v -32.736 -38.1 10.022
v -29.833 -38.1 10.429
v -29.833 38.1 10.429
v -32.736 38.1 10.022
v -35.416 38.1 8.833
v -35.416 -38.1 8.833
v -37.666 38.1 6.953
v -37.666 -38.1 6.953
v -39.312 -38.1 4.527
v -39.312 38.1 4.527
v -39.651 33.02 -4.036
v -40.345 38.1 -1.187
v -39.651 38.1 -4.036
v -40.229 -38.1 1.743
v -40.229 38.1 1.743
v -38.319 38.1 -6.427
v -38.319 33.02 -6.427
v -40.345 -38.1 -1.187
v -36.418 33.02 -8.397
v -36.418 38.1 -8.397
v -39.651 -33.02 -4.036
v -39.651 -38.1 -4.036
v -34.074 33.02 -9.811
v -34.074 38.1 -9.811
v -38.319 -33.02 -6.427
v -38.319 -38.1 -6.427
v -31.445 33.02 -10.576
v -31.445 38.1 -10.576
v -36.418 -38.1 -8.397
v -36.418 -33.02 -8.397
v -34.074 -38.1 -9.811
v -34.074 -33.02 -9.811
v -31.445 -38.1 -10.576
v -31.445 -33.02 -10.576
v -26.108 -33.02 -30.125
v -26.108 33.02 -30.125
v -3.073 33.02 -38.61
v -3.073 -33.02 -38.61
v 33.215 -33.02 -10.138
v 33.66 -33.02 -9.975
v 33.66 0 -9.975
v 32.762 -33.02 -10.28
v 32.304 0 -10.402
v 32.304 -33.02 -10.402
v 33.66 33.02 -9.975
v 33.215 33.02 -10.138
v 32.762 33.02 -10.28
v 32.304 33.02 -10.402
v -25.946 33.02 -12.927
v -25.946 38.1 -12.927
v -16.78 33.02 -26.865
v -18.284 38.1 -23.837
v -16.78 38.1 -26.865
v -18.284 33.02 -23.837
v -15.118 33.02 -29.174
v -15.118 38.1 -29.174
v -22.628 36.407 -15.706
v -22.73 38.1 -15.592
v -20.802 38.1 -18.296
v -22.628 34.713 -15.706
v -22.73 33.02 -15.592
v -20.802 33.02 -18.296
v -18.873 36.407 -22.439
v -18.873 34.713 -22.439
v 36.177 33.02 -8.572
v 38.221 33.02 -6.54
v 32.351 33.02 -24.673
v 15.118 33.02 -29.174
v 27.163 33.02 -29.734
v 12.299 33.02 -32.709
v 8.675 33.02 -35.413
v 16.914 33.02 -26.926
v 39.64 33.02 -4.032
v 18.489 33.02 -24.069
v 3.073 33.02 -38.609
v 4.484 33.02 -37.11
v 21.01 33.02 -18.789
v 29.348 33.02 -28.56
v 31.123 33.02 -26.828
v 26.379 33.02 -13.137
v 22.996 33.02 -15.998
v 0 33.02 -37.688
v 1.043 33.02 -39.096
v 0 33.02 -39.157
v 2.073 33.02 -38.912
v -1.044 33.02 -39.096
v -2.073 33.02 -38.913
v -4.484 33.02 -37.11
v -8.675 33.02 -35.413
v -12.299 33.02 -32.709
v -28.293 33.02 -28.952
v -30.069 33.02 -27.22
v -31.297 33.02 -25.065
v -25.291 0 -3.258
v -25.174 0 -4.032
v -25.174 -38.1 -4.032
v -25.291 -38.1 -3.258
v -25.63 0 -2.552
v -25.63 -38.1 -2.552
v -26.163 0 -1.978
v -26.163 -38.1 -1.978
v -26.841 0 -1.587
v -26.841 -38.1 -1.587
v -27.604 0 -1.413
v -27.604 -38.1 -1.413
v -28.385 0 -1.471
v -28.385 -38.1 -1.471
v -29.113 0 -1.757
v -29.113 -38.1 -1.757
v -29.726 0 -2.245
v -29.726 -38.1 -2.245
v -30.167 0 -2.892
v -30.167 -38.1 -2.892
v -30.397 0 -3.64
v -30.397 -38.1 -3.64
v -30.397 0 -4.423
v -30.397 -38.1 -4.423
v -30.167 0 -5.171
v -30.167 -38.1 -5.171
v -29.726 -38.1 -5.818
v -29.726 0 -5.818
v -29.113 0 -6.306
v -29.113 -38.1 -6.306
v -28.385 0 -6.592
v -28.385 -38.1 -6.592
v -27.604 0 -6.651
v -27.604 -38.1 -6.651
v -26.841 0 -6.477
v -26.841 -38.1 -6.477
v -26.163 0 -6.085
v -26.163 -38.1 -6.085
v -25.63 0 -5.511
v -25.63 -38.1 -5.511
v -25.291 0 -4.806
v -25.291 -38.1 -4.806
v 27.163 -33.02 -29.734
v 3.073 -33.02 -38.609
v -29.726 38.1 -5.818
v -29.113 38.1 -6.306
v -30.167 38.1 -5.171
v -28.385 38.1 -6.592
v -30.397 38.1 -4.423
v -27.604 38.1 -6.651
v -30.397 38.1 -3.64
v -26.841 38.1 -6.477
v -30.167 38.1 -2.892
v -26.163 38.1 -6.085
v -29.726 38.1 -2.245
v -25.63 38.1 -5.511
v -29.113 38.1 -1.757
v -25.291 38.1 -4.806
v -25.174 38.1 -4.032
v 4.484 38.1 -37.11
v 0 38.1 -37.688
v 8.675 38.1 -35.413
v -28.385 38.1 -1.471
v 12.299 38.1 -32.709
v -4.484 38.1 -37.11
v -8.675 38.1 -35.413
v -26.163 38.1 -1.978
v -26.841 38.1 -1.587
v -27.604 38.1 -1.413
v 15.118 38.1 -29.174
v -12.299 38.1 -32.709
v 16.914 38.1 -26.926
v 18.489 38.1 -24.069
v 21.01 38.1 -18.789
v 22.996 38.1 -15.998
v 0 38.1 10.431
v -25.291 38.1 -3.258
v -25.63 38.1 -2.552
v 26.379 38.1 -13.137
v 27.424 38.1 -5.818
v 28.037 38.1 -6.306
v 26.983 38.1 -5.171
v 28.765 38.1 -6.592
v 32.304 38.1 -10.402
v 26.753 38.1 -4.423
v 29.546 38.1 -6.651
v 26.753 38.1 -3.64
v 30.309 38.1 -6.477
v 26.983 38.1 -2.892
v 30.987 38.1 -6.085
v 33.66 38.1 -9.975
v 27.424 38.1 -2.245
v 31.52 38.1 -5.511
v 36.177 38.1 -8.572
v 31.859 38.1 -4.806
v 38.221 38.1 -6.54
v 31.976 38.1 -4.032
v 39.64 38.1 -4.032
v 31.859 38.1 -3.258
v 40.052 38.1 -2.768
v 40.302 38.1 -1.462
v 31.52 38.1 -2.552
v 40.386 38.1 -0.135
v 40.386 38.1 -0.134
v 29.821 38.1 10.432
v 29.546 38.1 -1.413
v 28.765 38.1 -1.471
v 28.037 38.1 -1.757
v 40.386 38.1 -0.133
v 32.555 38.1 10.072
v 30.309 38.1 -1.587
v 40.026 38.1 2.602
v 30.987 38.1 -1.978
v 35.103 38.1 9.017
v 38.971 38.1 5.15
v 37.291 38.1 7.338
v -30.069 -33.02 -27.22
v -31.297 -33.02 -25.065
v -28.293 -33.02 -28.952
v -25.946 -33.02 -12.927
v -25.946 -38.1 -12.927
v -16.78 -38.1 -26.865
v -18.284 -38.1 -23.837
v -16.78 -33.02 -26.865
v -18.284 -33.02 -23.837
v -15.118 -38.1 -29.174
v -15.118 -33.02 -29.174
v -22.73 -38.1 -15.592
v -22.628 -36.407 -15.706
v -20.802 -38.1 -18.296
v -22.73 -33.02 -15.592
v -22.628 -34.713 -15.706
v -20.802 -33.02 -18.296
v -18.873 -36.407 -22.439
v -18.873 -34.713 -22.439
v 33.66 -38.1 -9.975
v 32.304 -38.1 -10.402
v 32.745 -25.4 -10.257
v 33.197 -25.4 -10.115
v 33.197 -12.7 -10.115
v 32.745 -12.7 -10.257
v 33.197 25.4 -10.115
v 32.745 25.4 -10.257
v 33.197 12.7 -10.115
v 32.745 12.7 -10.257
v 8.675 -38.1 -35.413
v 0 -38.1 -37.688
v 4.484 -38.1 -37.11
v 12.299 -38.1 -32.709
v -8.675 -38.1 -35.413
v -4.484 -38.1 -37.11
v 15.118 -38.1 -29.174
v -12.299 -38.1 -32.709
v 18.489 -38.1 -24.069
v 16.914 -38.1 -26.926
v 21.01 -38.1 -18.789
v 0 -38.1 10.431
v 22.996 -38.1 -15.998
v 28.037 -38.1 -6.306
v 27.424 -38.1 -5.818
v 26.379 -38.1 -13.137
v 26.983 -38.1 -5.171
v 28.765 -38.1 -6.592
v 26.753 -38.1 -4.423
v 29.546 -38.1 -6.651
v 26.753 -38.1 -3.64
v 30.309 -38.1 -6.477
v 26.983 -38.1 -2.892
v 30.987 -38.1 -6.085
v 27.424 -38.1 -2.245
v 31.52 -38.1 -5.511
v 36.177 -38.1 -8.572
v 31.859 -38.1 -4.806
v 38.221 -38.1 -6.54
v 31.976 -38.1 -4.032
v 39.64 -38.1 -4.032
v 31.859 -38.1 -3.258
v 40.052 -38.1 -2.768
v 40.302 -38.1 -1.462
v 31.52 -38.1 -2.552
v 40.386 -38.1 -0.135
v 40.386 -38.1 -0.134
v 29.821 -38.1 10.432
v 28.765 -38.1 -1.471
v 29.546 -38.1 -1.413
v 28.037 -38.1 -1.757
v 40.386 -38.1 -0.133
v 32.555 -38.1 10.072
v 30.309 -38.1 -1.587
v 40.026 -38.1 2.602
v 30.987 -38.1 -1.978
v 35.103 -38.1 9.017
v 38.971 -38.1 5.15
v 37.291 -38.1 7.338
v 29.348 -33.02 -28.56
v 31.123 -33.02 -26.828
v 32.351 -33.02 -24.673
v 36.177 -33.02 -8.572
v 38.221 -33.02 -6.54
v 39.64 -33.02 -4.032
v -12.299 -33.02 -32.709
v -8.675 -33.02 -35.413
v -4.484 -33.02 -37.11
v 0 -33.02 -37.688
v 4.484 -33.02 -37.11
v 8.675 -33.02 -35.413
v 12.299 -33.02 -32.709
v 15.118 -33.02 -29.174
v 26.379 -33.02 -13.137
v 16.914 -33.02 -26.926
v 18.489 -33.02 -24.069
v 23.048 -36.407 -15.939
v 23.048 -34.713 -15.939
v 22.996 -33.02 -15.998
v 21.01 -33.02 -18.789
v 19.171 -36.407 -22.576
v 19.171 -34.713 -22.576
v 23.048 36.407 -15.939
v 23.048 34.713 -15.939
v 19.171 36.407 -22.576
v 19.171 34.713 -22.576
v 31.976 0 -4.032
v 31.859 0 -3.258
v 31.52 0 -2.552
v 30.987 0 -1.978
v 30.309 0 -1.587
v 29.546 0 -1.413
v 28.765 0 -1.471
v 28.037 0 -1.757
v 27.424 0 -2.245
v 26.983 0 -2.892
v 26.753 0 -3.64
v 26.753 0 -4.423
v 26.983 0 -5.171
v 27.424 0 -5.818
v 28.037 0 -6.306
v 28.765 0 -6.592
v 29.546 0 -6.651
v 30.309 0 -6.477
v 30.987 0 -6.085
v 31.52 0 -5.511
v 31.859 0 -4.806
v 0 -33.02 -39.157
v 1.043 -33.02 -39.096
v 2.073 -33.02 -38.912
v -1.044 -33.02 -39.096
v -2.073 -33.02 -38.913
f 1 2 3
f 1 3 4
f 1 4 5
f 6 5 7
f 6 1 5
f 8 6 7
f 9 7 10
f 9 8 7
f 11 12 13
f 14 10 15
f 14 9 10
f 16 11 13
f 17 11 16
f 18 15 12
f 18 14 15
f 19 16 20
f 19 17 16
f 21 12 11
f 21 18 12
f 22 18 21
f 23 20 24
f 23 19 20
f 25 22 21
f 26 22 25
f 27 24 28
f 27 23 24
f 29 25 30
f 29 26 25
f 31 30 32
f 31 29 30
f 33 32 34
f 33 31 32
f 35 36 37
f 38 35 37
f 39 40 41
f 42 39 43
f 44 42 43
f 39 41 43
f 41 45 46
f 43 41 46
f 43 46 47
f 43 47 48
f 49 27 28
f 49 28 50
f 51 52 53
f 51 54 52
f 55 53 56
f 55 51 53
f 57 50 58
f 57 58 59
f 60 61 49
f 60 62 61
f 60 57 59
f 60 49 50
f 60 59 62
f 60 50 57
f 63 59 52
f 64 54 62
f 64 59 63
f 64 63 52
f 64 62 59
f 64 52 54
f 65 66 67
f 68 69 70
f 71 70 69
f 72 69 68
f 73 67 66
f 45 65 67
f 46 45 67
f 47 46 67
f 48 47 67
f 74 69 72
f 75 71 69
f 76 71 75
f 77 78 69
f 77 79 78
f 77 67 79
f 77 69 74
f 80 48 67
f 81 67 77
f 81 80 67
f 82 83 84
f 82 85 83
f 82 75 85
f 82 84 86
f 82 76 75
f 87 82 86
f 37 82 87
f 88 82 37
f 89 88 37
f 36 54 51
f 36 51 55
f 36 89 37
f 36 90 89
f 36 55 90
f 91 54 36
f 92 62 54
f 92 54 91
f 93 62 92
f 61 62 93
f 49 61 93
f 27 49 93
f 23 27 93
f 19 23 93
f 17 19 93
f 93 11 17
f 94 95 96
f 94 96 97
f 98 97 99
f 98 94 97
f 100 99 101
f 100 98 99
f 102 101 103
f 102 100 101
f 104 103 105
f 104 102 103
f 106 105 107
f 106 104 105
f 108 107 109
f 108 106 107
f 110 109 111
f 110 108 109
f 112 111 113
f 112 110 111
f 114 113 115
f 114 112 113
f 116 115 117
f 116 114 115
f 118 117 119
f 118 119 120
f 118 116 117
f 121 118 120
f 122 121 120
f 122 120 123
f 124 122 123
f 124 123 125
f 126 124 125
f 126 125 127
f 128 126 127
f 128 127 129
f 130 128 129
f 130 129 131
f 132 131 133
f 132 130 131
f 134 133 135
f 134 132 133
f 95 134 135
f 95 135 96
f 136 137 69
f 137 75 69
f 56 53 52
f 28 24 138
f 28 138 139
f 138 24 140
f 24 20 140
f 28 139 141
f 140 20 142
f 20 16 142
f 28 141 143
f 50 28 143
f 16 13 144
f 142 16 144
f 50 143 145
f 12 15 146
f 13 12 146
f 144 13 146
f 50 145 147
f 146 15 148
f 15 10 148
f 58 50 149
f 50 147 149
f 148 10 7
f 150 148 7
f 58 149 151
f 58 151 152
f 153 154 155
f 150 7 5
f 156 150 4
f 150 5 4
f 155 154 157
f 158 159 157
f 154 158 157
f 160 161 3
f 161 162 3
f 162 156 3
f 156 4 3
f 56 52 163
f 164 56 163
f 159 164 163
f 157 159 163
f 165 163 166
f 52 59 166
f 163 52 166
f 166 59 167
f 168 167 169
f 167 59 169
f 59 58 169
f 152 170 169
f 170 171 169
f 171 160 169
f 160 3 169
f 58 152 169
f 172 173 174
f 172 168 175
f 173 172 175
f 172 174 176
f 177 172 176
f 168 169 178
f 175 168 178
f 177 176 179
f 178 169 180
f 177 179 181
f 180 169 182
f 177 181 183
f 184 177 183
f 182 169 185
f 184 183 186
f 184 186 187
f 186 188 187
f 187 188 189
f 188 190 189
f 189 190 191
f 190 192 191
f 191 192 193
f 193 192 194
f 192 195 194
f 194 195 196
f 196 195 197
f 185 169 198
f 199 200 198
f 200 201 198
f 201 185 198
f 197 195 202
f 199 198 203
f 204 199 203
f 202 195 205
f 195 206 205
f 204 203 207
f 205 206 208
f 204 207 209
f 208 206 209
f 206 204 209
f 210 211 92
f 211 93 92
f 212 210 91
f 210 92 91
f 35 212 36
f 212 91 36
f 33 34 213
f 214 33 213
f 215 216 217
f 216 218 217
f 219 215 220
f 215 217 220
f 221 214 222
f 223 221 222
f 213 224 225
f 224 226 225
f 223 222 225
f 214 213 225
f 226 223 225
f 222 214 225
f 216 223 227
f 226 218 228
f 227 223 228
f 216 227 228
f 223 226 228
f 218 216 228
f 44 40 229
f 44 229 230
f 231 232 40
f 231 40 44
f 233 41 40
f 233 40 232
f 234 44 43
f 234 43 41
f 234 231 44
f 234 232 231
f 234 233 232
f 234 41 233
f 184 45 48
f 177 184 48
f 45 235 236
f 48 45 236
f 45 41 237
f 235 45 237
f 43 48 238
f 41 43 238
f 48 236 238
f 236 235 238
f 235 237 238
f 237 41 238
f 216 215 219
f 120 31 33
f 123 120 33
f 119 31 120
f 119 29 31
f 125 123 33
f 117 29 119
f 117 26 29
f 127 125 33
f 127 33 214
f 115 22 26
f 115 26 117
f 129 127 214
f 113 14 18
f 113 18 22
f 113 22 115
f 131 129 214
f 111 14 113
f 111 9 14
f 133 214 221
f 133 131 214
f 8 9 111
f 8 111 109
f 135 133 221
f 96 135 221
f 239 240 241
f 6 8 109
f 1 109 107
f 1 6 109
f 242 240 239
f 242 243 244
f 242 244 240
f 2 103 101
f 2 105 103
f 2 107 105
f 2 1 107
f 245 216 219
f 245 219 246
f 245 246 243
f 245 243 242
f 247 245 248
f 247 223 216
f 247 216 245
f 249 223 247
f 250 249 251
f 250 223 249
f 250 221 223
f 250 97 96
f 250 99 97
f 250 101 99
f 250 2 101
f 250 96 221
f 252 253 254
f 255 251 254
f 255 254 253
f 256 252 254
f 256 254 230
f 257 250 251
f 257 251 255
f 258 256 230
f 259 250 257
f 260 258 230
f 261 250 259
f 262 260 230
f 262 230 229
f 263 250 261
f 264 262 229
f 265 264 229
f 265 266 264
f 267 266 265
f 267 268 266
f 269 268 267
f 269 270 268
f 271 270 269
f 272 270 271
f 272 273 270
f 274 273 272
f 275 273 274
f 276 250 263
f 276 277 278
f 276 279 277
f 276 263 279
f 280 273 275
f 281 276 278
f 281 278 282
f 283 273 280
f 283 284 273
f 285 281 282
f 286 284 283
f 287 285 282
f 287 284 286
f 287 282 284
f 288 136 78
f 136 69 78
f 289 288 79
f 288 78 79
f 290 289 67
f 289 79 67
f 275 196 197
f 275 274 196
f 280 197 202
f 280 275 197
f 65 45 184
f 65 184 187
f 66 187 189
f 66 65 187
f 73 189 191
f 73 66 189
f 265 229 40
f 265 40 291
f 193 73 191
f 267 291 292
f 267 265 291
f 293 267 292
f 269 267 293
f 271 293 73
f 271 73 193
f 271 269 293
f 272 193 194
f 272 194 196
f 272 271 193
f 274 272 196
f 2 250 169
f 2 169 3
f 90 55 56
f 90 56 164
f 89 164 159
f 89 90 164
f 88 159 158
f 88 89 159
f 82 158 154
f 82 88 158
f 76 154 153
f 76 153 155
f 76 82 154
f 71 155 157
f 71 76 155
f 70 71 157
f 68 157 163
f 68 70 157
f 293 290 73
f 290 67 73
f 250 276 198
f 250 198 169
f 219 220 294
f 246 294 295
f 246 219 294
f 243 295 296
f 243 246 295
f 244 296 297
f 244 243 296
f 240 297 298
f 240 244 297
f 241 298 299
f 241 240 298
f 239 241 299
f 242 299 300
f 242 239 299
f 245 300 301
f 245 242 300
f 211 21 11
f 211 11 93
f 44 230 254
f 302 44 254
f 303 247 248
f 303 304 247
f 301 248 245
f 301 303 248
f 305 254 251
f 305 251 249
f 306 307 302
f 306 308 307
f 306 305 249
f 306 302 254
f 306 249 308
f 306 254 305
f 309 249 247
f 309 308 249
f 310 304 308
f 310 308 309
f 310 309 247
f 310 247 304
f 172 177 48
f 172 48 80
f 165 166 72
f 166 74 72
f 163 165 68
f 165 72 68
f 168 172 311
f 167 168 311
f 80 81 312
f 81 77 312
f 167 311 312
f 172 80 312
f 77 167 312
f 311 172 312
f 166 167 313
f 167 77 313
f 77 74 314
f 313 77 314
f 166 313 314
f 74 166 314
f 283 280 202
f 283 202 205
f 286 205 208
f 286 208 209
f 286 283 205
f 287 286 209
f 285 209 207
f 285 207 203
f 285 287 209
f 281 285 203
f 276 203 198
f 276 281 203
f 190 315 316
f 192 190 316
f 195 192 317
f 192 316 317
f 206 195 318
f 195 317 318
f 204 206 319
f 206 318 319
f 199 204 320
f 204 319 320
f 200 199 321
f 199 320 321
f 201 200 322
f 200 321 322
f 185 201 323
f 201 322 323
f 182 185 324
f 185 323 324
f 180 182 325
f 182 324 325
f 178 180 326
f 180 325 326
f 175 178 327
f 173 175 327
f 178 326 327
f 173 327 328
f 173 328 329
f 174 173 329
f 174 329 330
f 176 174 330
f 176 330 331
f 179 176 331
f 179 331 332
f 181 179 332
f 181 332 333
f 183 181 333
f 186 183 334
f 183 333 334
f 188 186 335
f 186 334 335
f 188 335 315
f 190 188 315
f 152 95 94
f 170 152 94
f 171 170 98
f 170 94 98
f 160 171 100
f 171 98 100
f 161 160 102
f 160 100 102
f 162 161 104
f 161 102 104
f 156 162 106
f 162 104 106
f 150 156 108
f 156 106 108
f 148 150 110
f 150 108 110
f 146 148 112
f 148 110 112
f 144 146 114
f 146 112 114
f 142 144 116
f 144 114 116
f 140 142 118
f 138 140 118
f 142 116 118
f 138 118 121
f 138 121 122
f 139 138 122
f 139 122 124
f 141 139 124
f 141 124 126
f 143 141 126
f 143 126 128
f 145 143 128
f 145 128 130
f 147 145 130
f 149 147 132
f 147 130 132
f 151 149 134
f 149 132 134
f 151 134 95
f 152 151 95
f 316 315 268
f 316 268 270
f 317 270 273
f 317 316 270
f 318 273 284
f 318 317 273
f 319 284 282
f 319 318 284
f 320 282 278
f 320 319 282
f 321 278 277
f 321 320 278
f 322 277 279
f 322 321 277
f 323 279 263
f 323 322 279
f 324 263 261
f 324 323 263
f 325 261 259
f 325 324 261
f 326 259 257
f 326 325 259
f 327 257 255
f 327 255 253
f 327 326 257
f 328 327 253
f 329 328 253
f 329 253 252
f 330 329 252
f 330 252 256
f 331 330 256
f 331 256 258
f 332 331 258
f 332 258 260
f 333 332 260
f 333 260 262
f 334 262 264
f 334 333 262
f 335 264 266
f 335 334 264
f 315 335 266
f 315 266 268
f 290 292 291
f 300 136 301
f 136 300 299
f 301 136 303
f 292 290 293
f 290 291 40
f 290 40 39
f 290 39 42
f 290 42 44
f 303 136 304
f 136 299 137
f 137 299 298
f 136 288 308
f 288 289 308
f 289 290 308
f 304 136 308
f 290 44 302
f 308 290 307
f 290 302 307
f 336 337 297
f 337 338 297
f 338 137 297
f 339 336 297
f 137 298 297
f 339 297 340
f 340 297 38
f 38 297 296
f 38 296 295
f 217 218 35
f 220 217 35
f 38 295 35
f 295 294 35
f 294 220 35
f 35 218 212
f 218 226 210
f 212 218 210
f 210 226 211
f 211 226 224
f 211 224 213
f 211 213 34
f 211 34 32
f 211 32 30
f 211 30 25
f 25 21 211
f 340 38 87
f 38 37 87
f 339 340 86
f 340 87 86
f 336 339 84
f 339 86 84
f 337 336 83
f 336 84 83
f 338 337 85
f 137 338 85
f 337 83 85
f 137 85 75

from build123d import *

# Parameters (mm, degrees)
F1_DEPTH = 33.02
F0_R     = 2.6264362
F0_R_2   = 2.6264304873
F2_DEPTH = 38.1


with BuildPart() as f1:
    # F0 (on Front) → F1 (new body, symmetric)
    with BuildSketch(Plane.XZ):
        with BuildLine():
            add(Edge.make_bspline(
                [(-31.4454593495, -10.5763216779), (-18.4102778878, -14.3703602753), (-20.5599198365, -22.9724258326), (-15.1177148521, -29.1741350755)],
                knots=[0, 0, 0, 0, 24.7482101079, 24.7482101079, 24.7482101079, 24.7482101079], degree=3))
            ThreePointArc((-31.4454593495, -10.5763216779), (-36.4175873656, -8.3966690551), (-39.6507896865, -4.035551616))
            Line((-39.6507896865, -4.035551616), (-31.297441197, -25.0651440107))
            ThreePointArc((-31.297441197, -25.0651440107), (-29.241828265, -28.1482147194), (-26.1079207685, -30.1254585901))
            Line((-26.1079207685, -30.1254585901), (-3.0730358258, -38.6095386283))
            ThreePointArc((-3.0730358258, -38.6095386283), (-1.5607510796, -39.0193916461), (0, -39.1573797531))
            Line((0, -39.1573797531), (0, -37.687844526))
            ThreePointArc((0, -37.687844526), (-8.6750871891, -35.4130686309), (-15.1177148521, -29.1741350755))
        make_face()
        with BuildLine():
            ThreePointArc((33.6601813113, -9.9752325779), (32.9890386835, -10.2112882492), (32.3035305265, -10.4016386456))
            add(Edge.make_bspline(
                [(32.3035305265, -10.4016386456), (18.5081026821, -15.0106381958), (21.1109032546, -22.9743855244), (15.1177148521, -29.1741350755)],
                knots=[0.8170048254, 0.8170048254, 0.8170048254, 0.8170048254, 26.6912142755, 26.6912142755, 26.6912142755, 26.6912142755], degree=3))
            ThreePointArc((15.1177148521, -29.1741350755), (8.6750871891, -35.4130686309), (0, -37.687844526))
            Line((0, -37.687844526), (0, -39.1573797531))
            ThreePointArc((0, -39.1573797531), (1.5607053421, -39.0192220029), (3.0729166956, -38.6092152337))
            Line((3.0729166956, -38.6092152337), (27.1625130087, -29.7337906358))
            ThreePointArc((27.1625130087, -29.7337906358), (30.2961519286, -27.7562759529), (32.3514385124, -24.6730869774))
            Line((32.3514385124, -24.6730869774), (39.6400981385, -4.0318907199))
            ThreePointArc((39.6400981385, -4.0318907199), (37.2687025045, -7.6259310267), (33.6601813113, -9.9752325779))
        make_face()
    extrude(amount=F1_DEPTH, both=True)

    # F0 (on Front) → F2 (join, symmetric)
    with BuildSketch(Plane.XZ):
        with BuildLine():
            ThreePointArc((-31.4454593495, -10.5763216779), (-22.9558140486, -8.155960982), (-19.2675045322, -0.1354500166))
            ThreePointArc((-19.2675045322, -0.1354500166), (-22.3620278457, 7.3351409283), (-29.8327647689, 10.4293118073))
            ThreePointArc((-29.8327647689, 10.4293118073), (-38.5736258357, 5.7977470387), (-39.6507896865, -4.035551616))
            ThreePointArc((-39.6507896865, -4.035551616), (-36.4175873656, -8.3966690551), (-31.4454593495, -10.5763216779))
        make_face()
        with Locations((-27.8002675623, -4.0318907199)):
            Circle(F0_R, mode=Mode.SUBTRACT)
        with BuildLine():
            ThreePointArc((-29.8327647689, 10.4293118073), (-22.3620278457, 7.3351409283), (-19.2675045322, -0.1354500166))
            Line((-19.2675045322, -0.1354500166), (0, -0.1354500166))
            Line((0, -0.1354500166), (0, 10.4307191917))
            Line((0, 10.4307191917), (-29.8327647689, 10.4293118073))
        make_face()
        with BuildLine():
            Line((0, 10.4307191917), (0, -0.1354500166))
            Line((0, -0.1354500166), (19.2564770783, -0.1354500166))
            ThreePointArc((19.2564770783, -0.1354500166), (22.3496527134, 7.3366076469), (29.8207401381, 10.4321260089))
            Line((29.8207401381, 10.4321260089), (0, 10.4307191917))
        make_face()
        with BuildLine():
            ThreePointArc((29.8207401381, 10.4321260089), (22.3496527134, 7.3366076469), (19.2564770783, -0.1354500166))
            Line((19.2564770783, -0.1354500166), (40.386, -0.1354500166))
            ThreePointArc((40.386, -0.1354500166), (40.3860002811, -0.1340429158), (40.3860003748, -0.132635815))
            ThreePointArc((40.3860003748, -0.132635815), (37.2914770613, 7.3379551299), (29.8207401381, 10.4321260089))
        make_face()
        with BuildLine():
            Line((40.386, -0.1354500166), (19.2564770783, -0.1354500166))
            ThreePointArc((19.2564770783, -0.1354500166), (23.2882273315, -8.4352834172), (32.3035305265, -10.4016386456))
            add(Edge.make_bspline(
                [(33.6601813113, -9.9752325779), (33.1910900089, -10.1139156622), (32.7391353761, -10.2561047355), (32.3035305265, -10.4016386456)],
                knots=[0, 0, 0, 0, 0.8170048254, 0.8170048254, 0.8170048254, 0.8170048254], degree=3))
            ThreePointArc((33.6601813113, -9.9752325779), (37.2687025045, -7.6259310267), (39.6400981385, -4.0318907199))
            ThreePointArc((39.6400981385, -4.0318907199), (40.1975849298, -2.1189963626), (40.386, -0.1354500166))
        make_face()
        with Locations((29.3497324377, -4.0318907199)):
            Circle(F0_R_2, mode=Mode.SUBTRACT)
        with BuildLine():
            Line((19.2564770783, -0.1354500166), (0, -0.1354500166))
            Line((0, -0.1354500166), (0, -2.329749126))
            ThreePointArc((0, -2.329749126), (12.5009745136, -7.5078223124), (17.6790477, -20.008796826))
            ThreePointArc((17.6790477, -20.008796826), (17.0266780313, -24.7670488997), (15.1177148521, -29.1741350755))
            add(Edge.make_bspline(
                [(32.3035305265, -10.4016386456), (18.5081026821, -15.0106381958), (21.1109032546, -22.9743855244), (15.1177148521, -29.1741350755)],
                knots=[0.8170048254, 0.8170048254, 0.8170048254, 0.8170048254, 26.6912142755, 26.6912142755, 26.6912142755, 26.6912142755], degree=3))
            ThreePointArc((32.3035305265, -10.4016386456), (23.2882273315, -8.4352834172), (19.2564770783, -0.1354500166))
        make_face()
        with BuildLine():
            ThreePointArc((17.6790477, -20.008796826), (12.5009745136, -7.5078223124), (0, -2.329749126))
            Line((0, -2.329749126), (0, -5.484860926))
            ThreePointArc((0, -5.484860926), (10.2699735644, -9.7388232616), (14.5239359, -20.008796826))
            ThreePointArc((14.5239359, -20.008796826), (10.2699735644, -30.2787703904), (0, -34.532732726))
            Line((0, -34.532732726), (0, -37.687844526))
            ThreePointArc((0, -37.687844526), (8.6750871891, -35.4130686309), (15.1177148521, -29.1741350755))
            ThreePointArc((15.1177148521, -29.1741350755), (17.0266780313, -24.7670488997), (17.6790477, -20.008796826))
        make_face()
        with BuildLine():
            Line((0, -0.1354500166), (-19.2675045322, -0.1354500166))
            ThreePointArc((-19.2675045322, -0.1354500166), (-22.9558140486, -8.155960982), (-31.4454593495, -10.5763216779))
            add(Edge.make_bspline(
                [(-31.4454593495, -10.5763216779), (-18.4102778878, -14.3703602753), (-20.5599198365, -22.9724258326), (-15.1177148521, -29.1741350755)],
                knots=[0, 0, 0, 0, 24.7482101079, 24.7482101079, 24.7482101079, 24.7482101079], degree=3))
            ThreePointArc((-15.1177148521, -29.1741350755), (-15.4042718049, -11.3337096369), (0, -2.329749126))
            Line((0, -2.329749126), (0, -0.1354500166))
        make_face()
        with BuildLine():
            Line((0, -5.484860926), (0, -2.329749126))
            ThreePointArc((0, -2.329749126), (-15.4042718049, -11.3337096369), (-15.1177148521, -29.1741350755))
            ThreePointArc((-15.1177148521, -29.1741350755), (-8.6750871891, -35.4130686309), (0, -37.687844526))
            Line((0, -37.687844526), (0, -34.532732726))
            ThreePointArc((0, -34.532732726), (-14.5239359, -20.008796826), (0, -5.484860926))
        make_face()
        with BuildLine():
            Line((0, -34.532732726), (0, -5.484860926))
            ThreePointArc((0, -5.484860926), (-14.5239359, -20.008796826), (0, -34.532732726))
        make_face()
        with BuildLine():
            ThreePointArc((14.5239359, -20.008796826), (10.2699735644, -9.7388232616), (0, -5.484860926))
            Line((0, -5.484860926), (0, -34.532732726))
            ThreePointArc((0, -34.532732726), (10.2699735644, -30.2787703904), (14.5239359, -20.008796826))
        make_face()
    extrude(amount=F2_DEPTH, both=True)


solid = f1.part
